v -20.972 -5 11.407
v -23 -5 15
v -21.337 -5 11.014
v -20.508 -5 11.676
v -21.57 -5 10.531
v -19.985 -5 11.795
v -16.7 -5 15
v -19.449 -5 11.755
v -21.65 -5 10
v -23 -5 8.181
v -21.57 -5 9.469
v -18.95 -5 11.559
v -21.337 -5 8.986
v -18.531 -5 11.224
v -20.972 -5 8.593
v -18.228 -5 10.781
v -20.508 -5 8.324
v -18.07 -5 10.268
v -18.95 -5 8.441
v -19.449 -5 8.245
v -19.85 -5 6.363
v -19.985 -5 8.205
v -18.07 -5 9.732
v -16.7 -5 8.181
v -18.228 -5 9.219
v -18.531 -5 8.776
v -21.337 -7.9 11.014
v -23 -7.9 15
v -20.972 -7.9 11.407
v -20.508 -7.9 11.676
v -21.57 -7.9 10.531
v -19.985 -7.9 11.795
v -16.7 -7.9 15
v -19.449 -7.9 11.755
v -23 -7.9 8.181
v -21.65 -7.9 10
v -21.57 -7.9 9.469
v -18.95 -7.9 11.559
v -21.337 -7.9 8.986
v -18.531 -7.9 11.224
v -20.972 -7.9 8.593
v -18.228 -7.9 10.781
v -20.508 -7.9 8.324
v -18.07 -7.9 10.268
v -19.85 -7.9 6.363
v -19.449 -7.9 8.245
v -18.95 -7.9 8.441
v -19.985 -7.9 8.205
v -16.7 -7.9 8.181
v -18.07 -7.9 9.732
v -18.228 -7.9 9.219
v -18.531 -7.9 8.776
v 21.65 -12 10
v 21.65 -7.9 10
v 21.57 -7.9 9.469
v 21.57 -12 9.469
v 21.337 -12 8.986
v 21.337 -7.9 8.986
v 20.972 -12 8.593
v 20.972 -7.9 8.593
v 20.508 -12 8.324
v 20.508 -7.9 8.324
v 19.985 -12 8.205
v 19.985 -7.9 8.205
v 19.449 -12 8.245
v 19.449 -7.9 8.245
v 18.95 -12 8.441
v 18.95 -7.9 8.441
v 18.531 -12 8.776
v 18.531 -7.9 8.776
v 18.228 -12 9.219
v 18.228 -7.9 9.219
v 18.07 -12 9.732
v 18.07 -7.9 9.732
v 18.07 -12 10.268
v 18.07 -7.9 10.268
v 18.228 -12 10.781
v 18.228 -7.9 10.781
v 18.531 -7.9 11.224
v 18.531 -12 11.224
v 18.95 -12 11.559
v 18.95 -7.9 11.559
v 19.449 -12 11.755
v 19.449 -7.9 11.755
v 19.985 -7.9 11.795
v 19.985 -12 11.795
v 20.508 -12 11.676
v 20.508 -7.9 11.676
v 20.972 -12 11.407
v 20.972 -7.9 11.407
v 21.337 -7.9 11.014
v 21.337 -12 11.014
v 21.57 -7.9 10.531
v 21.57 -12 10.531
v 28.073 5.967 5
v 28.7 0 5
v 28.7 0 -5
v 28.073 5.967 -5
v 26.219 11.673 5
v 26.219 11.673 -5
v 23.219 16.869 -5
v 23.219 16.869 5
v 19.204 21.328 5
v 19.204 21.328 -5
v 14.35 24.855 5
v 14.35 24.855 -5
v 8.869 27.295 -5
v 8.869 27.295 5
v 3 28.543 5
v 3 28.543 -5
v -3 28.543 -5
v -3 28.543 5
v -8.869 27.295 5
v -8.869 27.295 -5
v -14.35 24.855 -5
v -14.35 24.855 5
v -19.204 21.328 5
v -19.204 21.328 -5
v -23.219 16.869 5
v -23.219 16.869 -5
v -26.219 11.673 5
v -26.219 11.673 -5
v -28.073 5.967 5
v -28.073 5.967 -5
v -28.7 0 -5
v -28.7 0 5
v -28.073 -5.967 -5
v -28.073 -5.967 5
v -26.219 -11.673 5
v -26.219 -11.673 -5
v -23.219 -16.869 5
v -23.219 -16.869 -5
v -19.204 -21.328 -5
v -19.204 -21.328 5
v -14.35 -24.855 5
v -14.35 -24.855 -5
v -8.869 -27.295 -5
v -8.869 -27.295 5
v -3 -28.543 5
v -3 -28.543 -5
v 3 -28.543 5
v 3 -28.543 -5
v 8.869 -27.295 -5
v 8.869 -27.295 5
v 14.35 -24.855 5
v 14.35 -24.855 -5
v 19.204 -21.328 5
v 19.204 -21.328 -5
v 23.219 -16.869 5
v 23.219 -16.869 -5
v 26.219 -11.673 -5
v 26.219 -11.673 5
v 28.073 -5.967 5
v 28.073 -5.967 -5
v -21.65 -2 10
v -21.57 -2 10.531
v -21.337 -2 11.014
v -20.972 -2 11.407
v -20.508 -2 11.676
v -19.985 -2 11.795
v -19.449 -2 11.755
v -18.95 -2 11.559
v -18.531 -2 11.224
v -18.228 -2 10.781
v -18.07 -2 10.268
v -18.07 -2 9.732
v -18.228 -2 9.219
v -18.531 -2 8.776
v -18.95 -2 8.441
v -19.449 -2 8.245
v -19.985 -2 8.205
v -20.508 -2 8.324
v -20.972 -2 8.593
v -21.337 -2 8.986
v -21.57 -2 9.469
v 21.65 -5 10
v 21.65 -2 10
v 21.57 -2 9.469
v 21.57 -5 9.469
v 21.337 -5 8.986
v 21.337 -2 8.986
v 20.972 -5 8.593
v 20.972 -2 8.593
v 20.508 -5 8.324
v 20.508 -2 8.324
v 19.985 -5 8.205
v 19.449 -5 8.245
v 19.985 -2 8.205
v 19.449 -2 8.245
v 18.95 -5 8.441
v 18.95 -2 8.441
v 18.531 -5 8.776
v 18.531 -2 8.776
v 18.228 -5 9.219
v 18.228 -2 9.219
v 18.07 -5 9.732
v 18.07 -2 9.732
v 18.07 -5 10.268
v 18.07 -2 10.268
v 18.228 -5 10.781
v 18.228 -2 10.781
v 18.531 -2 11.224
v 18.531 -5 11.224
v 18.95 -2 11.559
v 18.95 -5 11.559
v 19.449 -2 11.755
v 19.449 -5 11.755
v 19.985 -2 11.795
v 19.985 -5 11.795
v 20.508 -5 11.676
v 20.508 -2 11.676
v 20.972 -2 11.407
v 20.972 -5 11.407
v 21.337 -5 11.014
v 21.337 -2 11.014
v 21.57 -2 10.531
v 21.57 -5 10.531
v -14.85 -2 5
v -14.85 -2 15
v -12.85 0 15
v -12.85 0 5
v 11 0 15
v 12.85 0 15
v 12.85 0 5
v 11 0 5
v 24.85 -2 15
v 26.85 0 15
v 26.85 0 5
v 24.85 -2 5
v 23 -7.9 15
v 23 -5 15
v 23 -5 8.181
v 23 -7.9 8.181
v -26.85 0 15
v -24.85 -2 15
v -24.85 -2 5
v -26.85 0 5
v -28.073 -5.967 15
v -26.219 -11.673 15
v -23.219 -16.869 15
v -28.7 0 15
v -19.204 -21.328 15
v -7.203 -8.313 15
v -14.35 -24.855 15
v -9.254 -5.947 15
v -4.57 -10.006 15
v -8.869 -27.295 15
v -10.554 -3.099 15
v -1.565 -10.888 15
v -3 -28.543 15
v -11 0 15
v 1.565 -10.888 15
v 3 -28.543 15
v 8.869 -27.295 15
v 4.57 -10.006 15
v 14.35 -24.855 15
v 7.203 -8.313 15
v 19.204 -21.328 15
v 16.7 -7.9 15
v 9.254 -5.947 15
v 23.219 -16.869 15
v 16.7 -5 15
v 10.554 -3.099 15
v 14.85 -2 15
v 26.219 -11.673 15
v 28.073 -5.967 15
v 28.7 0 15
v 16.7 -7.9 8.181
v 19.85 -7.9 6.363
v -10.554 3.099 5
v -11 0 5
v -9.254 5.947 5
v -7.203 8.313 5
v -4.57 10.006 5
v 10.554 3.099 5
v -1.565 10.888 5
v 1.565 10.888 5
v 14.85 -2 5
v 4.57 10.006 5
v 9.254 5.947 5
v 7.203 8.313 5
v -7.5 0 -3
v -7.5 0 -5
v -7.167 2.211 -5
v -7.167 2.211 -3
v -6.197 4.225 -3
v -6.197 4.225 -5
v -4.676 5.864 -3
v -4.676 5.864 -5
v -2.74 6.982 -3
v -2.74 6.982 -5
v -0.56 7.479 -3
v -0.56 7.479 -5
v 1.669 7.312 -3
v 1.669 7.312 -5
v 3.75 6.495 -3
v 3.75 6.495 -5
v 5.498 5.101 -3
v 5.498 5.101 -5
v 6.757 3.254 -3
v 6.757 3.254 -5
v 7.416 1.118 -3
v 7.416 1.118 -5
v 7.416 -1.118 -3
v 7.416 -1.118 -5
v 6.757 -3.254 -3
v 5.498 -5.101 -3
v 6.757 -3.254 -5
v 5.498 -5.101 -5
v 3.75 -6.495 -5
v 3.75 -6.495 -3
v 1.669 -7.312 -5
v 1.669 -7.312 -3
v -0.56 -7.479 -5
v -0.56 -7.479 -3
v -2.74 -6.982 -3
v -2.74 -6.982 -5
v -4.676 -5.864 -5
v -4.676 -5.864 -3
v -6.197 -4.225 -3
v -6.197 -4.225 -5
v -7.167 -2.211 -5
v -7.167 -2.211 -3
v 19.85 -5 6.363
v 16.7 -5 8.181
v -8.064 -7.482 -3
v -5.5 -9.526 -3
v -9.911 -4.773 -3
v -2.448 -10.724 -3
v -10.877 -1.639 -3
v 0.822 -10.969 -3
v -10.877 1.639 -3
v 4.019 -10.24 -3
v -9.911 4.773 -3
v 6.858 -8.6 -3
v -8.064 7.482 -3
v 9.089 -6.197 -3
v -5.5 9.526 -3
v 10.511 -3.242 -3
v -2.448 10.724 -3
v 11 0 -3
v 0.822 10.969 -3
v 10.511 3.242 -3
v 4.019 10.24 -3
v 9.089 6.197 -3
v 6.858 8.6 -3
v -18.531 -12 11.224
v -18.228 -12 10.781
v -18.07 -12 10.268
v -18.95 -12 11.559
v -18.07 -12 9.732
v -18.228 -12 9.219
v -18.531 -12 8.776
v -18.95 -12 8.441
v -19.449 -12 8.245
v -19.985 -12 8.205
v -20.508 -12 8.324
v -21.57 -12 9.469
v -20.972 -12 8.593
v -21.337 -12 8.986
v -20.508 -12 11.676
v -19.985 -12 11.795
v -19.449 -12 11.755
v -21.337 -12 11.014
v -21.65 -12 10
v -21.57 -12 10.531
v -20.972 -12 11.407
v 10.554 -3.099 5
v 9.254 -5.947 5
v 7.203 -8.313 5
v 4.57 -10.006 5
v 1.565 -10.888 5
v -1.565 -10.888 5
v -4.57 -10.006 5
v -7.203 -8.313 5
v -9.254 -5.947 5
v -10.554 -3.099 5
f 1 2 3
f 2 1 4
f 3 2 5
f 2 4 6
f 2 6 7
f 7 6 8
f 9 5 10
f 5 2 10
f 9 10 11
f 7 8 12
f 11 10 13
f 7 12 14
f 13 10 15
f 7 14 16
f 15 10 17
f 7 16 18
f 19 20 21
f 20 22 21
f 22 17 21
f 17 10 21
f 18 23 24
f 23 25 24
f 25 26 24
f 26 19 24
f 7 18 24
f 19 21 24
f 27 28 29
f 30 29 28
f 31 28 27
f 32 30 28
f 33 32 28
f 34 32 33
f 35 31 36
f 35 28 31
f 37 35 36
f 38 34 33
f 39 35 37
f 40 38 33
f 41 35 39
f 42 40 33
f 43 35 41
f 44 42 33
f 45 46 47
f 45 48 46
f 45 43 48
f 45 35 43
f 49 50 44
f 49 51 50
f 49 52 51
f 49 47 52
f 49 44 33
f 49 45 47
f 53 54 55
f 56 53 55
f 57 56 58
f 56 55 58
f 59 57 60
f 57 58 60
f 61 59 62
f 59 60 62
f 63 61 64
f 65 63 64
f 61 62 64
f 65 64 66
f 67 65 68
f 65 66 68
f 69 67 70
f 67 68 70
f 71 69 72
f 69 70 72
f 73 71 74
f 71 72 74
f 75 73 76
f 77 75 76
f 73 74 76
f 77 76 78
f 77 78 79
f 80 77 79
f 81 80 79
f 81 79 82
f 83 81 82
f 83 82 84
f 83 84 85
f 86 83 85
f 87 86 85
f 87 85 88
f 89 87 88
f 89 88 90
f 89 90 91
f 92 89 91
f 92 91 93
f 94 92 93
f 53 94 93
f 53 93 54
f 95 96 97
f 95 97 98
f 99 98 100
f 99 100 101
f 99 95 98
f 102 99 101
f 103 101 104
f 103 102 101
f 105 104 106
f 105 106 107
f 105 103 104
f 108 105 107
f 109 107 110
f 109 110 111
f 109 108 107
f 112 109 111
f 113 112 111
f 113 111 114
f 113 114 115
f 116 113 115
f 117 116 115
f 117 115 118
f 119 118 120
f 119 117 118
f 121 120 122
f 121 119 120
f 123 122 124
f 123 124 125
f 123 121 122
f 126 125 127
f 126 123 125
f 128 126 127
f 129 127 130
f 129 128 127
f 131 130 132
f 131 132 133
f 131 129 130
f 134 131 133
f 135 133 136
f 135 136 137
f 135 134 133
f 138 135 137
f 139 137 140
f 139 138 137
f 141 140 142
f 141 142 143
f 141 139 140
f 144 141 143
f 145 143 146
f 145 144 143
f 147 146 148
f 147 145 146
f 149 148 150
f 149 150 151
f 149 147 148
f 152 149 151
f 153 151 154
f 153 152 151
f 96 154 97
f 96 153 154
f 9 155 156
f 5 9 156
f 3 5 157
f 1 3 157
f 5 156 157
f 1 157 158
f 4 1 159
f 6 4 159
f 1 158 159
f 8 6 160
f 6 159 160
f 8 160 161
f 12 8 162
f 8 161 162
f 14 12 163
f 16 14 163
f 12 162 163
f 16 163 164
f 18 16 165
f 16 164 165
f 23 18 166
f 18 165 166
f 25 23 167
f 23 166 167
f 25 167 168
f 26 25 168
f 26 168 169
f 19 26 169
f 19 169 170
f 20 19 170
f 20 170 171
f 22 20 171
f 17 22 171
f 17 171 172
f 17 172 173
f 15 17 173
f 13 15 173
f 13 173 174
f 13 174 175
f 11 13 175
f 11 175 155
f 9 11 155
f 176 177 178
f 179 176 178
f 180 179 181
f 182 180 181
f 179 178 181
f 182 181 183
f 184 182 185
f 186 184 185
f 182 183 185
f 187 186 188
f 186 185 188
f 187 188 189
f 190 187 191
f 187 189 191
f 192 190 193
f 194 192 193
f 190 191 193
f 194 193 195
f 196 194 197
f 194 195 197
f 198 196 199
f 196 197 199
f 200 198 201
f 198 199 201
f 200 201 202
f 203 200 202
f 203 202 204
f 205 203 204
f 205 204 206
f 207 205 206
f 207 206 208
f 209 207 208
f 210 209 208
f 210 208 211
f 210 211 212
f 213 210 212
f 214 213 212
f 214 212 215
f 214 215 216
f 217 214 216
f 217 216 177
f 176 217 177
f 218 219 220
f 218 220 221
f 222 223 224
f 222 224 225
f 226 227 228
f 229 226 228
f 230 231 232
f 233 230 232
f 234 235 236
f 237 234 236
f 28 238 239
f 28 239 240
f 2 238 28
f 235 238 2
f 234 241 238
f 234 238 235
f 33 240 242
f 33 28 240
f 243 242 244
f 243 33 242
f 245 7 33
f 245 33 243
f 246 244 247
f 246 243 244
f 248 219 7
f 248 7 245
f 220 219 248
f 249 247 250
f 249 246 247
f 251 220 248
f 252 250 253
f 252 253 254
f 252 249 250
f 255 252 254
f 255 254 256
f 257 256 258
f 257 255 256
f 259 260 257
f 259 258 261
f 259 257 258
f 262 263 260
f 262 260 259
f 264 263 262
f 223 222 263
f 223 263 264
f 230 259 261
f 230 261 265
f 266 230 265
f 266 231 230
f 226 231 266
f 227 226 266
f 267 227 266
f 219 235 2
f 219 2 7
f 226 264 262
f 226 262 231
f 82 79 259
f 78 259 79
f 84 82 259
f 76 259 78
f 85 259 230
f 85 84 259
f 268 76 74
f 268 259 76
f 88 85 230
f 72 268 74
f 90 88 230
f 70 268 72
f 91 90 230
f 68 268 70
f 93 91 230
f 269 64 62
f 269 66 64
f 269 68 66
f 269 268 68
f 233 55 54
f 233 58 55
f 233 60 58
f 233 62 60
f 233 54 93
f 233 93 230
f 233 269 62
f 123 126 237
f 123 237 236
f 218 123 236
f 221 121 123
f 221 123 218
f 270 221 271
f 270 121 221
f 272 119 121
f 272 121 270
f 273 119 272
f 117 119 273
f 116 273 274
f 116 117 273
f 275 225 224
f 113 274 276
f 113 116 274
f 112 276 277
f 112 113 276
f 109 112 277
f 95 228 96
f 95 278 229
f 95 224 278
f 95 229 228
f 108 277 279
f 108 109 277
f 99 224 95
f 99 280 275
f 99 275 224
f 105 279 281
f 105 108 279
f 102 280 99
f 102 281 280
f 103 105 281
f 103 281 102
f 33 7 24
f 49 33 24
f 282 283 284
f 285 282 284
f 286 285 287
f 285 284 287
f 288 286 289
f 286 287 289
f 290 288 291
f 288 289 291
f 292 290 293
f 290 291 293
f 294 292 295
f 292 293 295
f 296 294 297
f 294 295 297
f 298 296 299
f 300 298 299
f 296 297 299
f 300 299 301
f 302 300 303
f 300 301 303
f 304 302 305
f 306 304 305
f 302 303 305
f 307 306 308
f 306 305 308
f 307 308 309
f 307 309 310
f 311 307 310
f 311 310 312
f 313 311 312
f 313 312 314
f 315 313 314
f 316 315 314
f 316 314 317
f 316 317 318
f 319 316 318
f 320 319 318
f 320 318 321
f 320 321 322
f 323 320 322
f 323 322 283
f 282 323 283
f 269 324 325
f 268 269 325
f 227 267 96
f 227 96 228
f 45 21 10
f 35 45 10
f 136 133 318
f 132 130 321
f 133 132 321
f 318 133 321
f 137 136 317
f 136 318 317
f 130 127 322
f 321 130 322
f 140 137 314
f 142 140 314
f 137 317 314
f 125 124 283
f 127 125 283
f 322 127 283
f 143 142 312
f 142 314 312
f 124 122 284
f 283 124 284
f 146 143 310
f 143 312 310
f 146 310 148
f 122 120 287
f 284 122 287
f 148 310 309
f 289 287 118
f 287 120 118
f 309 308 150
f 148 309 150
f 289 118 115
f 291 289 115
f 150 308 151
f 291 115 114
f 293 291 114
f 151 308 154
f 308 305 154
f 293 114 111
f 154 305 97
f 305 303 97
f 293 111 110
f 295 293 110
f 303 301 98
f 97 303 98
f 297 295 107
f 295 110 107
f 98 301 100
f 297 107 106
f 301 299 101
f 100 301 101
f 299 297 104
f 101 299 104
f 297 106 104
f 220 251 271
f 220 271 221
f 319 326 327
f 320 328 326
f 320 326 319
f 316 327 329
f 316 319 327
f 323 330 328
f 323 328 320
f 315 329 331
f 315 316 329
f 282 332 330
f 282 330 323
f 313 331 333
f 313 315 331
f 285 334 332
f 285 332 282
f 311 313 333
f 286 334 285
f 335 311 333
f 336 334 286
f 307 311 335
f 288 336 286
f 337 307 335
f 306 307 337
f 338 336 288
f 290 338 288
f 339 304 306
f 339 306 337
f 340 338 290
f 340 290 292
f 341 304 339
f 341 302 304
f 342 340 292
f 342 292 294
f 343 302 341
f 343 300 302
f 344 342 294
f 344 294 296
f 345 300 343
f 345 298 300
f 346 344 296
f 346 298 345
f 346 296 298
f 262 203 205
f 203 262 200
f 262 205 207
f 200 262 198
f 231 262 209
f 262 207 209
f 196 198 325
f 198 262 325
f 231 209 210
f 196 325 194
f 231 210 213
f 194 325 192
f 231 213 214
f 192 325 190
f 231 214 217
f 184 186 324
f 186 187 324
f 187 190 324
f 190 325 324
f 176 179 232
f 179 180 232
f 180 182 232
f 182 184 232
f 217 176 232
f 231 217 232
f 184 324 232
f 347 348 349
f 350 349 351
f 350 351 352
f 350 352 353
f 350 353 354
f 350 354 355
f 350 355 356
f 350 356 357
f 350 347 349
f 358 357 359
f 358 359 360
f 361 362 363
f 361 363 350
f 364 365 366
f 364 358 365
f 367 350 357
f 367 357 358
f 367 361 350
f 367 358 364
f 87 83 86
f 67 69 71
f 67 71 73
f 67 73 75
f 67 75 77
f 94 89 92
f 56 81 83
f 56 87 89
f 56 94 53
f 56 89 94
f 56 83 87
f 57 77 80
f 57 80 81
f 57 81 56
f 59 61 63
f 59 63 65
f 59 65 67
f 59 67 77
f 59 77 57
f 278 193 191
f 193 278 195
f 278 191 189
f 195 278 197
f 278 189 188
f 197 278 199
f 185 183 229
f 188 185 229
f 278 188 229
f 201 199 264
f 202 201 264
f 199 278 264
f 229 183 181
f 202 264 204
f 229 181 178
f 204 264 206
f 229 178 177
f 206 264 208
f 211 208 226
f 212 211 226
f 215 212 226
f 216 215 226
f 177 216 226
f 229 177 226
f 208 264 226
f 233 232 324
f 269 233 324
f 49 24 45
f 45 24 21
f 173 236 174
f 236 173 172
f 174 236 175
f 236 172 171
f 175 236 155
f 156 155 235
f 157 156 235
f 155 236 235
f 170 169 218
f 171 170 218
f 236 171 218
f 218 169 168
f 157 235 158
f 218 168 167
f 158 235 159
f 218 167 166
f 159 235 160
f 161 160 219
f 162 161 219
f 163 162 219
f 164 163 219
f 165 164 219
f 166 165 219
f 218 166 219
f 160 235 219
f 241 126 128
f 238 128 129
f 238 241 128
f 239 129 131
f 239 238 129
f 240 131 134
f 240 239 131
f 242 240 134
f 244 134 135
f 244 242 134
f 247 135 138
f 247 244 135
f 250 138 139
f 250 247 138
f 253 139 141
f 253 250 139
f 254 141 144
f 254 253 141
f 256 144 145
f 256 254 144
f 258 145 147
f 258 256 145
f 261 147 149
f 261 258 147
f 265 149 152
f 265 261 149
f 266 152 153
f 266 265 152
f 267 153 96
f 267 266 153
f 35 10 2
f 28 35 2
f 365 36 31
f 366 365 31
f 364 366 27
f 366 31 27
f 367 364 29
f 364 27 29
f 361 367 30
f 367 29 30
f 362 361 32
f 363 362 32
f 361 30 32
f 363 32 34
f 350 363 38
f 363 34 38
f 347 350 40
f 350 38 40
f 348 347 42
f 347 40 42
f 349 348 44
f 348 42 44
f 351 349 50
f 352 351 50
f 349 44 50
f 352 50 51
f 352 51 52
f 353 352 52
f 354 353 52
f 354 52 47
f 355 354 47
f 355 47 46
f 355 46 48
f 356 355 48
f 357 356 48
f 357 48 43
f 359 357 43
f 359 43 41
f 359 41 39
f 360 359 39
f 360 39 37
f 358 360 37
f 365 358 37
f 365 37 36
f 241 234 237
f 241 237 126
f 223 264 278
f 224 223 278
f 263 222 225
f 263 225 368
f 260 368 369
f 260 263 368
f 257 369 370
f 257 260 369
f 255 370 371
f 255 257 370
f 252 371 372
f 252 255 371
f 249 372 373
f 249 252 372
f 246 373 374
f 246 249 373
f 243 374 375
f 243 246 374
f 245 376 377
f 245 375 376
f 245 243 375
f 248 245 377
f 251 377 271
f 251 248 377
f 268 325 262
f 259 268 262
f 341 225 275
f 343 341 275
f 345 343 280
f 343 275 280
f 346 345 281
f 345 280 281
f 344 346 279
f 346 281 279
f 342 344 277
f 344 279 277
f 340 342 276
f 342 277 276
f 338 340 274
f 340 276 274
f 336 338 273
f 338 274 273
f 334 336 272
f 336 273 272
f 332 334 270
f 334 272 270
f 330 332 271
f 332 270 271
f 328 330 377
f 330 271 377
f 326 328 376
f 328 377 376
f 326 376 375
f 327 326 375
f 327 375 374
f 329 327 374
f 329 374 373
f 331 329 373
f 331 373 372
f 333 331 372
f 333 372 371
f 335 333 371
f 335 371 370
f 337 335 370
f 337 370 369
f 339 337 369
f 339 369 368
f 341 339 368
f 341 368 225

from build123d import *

# Parameters (mm, degrees)
ESBO_O1_R                = 28.7
RESSALTO_EXTRUS_O1_DEPTH = 5
ESBO_O2_R                = 11
CORTE_EXTRUS_O1_DEPTH    = 8
ESBO_O3_R                = 7.5
CORTE_EXTRUS_O2_DEPTH    = 42.801674608
RESSALTO_EXTRUS_O4_START = 10
RESSALTO_EXTRUS_O4_DEPTH = 10
ESBO_O9_W                = 10
ESBO_O9_H                = 2
CORTE_EXTRUS_O5_DEPTH    = 10
CHANFRO1_SIZE            = 2
ESBO_O10_R               = 1.8
CORTE_EXTRUS_O6_DEPTH    = 10
CORTE_EXTRUS_O7_START    = -3
CORTE_EXTRUS_O7_DEPTH    = 2.9


with BuildPart() as part:
    # Esboço1 → Ressalto-extrusão1 (new, symmetric)
    with BuildSketch(Plane.XY):
        Circle(ESBO_O1_R)
    extrude(amount=RESSALTO_EXTRUS_O1_DEPTH, both=True)

    # Esboço2 → Corte-extrusão1 (cut)
    with BuildSketch(Plane.XY.offset(5)):
        Circle(ESBO_O2_R)
    extrude(amount=-CORTE_EXTRUS_O1_DEPTH, mode=Mode.SUBTRACT)

    # Esboço3 → Corte-extrusão2 (cut, through all)
    with BuildSketch(Plane(origin=(0, 0, -5), x_dir=(-1, 0, 0), z_dir=(0, 0, -1))):
        Circle(ESBO_O3_R)
    extrude(amount=-CORTE_EXTRUS_O2_DEPTH, mode=Mode.SUBTRACT)

    # Esboço8 → Ressalto-extrusão4 (add)
    with BuildSketch(Plane.XY.offset(5).offset(RESSALTO_EXTRUS_O4_START)):
        with BuildLine():
            Line((-11, 0), (-28.7, 0))
            ThreePointArc((-28.7, 0), (0, -28.7), (28.7, 0))
            Line((28.7, 0), (11, 0))
            ThreePointArc((11, 0), (0, -11), (-11, 0))
        make_face()
    extrude(amount=-RESSALTO_EXTRUS_O4_DEPTH)

    # Esboço9 → Corte-extrusão5 (cut)
    with BuildSketch(Plane.XY.offset(15)):
        with Locations((-19.85, -1)):
            Rectangle(ESBO_O9_W, ESBO_O9_H)
        with Locations((19.85, -1)):
            Rectangle(ESBO_O9_W, ESBO_O9_H)
    extrude(amount=-CORTE_EXTRUS_O5_DEPTH, mode=Mode.SUBTRACT)

    # Chanfro1
    chanfro1_edges = [part.edges().sort_by_distance(p)[0] for p in [
        (24.85, 0, 10),
        (14.85, 0, 10),
        (-14.85, 0, 10),
        (-24.85, 0, 10),
    ]]
    chamfer(chanfro1_edges, length=CHANFRO1_SIZE - 0.0001)  # a hair under: the kernel refuses the full size

    # Esboço10 → Corte-extrusão6 (cut)
    with BuildSketch(Plane(origin=(0, -2, 0), x_dir=(1, 0, 0), z_dir=(0, 1, 0))):
        with Locations(Location((-19.85, -10, 0), (0, 0, 180))):
            Circle(ESBO_O10_R)
        with Locations((19.85, -10)):
            Circle(ESBO_O10_R)
    extrude(amount=-CORTE_EXTRUS_O6_DEPTH, mode=Mode.SUBTRACT)

    # Esboço11 → Corte-extrusão7 (cut)
    with BuildSketch(Plane(origin=(0, -2, 0), x_dir=(1, 0, 0), z_dir=(0, 1, 0)).offset(CORTE_EXTRUS_O7_START)):
        Polygon((-23, -8.181346652), (-23, -11.818653348), (-23, -15), (-16.7, -15), (-16.7, -11.818653348), (-16.7, -8.181346652), (-19.85, -6.362693304), align=None)
        Polygon((23, -15), (23, -11.818653348), (23, -8.181346652), (19.85, -6.362693304), (16.7, -8.181346652), (16.7, -11.818653348), (16.7, -15), align=None)
    extrude(amount=-CORTE_EXTRUS_O7_DEPTH, mode=Mode.SUBTRACT)


solid = part.part
